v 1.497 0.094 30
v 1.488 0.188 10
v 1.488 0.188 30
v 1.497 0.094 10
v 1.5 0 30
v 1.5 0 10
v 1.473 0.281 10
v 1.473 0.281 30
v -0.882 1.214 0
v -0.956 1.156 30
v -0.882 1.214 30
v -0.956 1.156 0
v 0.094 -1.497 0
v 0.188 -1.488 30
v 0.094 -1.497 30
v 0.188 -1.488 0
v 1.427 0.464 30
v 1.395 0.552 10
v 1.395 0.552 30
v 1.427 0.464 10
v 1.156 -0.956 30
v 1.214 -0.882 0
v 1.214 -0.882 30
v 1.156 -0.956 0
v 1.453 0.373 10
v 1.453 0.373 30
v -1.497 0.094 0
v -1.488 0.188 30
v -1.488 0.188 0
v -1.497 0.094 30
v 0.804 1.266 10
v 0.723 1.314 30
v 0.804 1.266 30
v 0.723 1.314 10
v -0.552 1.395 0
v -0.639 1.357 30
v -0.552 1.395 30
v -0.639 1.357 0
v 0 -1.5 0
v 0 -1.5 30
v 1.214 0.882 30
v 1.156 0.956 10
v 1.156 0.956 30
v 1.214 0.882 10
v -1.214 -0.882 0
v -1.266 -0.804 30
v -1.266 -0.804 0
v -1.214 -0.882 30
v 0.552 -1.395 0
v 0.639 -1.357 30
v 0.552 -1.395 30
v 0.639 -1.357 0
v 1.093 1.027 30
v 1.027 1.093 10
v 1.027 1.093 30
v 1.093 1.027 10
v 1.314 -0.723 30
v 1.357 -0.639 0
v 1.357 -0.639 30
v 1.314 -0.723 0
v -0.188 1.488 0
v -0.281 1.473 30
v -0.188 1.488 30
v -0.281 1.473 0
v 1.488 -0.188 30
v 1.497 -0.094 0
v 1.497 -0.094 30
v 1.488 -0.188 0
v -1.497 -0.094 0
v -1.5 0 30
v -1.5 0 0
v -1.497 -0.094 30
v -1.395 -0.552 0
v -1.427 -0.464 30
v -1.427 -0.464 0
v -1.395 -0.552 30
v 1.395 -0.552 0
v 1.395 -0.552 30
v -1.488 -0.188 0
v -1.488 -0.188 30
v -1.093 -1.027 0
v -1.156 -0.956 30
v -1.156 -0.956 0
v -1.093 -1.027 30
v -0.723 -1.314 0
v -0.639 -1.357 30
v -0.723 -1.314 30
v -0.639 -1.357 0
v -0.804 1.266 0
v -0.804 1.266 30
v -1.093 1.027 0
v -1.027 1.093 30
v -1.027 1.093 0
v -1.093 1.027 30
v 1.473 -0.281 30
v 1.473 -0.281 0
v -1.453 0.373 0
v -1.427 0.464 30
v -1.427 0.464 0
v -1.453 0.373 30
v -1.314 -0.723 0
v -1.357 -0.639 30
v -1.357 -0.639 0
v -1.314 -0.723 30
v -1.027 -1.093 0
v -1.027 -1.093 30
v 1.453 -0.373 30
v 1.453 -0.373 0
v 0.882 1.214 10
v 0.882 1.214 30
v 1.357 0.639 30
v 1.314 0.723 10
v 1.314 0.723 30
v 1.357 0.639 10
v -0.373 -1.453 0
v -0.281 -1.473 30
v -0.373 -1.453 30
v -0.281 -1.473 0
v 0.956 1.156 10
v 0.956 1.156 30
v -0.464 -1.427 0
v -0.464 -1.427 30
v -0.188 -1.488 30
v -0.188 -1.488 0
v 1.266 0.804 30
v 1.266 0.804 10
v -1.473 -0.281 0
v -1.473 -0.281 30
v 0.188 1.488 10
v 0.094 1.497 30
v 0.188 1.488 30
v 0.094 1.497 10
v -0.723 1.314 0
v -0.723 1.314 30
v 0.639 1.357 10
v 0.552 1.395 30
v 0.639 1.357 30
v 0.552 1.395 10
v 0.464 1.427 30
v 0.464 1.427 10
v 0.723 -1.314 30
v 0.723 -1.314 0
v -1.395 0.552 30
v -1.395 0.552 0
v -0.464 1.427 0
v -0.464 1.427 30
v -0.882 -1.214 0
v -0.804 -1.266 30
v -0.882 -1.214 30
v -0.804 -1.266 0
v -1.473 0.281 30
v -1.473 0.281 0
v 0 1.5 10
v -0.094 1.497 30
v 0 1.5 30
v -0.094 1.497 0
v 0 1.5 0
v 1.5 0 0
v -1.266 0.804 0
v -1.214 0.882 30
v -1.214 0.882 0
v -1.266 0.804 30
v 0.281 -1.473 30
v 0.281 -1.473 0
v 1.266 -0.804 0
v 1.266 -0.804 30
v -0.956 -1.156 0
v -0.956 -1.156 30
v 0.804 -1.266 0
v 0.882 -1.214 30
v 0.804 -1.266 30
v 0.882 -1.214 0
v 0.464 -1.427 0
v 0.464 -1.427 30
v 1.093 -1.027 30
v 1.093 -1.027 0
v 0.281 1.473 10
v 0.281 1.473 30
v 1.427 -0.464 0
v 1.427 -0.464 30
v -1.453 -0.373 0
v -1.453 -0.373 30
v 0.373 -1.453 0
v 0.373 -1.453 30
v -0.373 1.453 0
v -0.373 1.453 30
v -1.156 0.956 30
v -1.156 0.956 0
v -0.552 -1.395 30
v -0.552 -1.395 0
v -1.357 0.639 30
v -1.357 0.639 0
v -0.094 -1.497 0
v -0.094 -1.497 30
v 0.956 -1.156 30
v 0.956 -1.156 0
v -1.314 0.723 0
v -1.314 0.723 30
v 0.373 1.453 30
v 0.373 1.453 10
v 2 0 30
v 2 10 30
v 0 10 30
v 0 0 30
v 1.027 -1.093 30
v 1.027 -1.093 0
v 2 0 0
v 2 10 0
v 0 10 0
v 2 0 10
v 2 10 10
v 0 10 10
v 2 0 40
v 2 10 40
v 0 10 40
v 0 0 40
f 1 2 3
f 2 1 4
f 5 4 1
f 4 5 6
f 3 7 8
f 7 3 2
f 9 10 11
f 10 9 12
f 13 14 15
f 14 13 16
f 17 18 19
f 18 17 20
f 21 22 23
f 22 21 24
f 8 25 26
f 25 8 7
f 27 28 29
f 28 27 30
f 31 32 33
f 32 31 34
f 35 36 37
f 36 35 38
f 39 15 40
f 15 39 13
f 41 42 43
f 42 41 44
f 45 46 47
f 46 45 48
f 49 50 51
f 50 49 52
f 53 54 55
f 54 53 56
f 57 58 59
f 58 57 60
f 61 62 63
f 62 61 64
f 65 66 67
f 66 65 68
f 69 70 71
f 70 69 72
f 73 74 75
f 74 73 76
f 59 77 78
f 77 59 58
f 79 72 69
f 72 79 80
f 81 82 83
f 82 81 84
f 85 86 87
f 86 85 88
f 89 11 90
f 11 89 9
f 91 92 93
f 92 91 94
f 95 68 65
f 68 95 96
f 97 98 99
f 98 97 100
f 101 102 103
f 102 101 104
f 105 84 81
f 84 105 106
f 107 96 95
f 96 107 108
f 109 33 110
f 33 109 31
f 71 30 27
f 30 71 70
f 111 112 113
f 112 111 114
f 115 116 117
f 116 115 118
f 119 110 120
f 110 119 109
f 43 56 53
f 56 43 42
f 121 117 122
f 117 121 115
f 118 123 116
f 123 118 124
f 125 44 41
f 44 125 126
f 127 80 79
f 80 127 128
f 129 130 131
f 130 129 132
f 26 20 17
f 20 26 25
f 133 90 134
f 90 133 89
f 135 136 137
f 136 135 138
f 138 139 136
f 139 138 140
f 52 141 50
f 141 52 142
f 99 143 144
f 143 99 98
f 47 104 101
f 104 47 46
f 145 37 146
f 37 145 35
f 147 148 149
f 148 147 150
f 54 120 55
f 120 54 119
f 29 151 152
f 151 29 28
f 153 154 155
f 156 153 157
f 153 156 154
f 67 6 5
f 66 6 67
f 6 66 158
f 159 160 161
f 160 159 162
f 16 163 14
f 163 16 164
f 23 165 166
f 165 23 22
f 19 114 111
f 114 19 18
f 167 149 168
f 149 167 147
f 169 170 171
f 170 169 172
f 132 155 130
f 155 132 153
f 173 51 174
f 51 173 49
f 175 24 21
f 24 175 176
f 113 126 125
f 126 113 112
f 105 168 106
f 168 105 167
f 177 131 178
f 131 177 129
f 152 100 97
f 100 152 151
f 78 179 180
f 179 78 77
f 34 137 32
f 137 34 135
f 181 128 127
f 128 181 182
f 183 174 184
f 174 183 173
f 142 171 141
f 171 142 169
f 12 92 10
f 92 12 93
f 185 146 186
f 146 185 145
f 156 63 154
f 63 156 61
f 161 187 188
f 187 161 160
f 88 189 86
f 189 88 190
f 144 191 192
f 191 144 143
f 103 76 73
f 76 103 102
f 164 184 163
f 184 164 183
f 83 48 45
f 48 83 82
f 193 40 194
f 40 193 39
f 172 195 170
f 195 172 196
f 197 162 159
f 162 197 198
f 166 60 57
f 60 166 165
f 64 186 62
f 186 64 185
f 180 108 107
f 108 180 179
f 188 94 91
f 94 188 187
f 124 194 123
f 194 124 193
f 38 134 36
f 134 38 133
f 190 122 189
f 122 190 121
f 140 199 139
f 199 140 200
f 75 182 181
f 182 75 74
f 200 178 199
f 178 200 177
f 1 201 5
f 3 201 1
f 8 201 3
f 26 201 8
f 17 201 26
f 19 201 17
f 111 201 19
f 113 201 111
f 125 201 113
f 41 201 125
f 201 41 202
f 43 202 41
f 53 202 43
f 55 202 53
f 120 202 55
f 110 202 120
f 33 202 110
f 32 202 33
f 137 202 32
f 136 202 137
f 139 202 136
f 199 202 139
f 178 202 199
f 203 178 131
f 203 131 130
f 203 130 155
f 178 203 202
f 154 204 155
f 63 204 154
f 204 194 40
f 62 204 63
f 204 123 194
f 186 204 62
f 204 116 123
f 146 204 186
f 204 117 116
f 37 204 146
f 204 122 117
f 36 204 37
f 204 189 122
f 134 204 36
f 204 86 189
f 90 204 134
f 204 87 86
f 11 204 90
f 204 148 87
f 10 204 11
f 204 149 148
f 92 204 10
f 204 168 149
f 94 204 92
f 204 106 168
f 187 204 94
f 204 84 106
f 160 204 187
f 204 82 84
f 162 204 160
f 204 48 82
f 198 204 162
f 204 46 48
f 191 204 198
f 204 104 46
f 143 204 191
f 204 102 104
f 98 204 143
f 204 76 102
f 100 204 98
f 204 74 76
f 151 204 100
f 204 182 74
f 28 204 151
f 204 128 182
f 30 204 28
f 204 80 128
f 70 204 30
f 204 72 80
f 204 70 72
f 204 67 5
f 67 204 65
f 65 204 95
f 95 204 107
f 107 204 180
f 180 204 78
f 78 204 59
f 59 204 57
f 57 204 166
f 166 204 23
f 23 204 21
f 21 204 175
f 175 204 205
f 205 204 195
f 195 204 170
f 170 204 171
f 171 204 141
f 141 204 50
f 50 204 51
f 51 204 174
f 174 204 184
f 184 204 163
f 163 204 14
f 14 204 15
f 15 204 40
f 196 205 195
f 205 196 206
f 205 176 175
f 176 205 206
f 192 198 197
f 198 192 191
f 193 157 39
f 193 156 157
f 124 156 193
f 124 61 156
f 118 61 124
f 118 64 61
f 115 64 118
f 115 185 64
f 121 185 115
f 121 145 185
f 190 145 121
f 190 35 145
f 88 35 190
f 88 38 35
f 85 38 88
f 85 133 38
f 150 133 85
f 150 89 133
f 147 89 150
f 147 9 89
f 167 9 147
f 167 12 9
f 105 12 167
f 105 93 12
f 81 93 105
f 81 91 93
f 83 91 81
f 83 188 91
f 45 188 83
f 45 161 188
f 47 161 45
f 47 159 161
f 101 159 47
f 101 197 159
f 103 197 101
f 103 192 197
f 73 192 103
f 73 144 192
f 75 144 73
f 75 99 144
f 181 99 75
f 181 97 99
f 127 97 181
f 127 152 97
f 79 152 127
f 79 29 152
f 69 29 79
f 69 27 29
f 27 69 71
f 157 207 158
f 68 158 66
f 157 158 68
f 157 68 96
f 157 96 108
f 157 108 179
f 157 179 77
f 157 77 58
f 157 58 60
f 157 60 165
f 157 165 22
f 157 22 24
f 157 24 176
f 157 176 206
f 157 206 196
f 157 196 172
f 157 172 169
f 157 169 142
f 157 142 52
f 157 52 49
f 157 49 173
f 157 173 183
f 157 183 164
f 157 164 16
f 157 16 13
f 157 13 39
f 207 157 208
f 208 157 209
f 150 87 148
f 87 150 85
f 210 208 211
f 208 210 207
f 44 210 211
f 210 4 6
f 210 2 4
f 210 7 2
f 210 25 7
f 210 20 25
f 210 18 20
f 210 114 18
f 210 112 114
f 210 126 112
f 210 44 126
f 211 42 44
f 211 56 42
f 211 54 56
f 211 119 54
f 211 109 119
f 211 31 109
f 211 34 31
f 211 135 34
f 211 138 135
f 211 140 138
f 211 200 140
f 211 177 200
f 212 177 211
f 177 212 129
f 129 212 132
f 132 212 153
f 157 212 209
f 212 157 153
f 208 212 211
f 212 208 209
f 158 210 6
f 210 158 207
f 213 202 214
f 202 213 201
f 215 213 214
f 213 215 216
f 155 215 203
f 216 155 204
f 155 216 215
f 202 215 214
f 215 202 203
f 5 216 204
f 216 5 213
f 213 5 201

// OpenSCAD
module key() {
    union() {
        cylinder(d=3 , h= 30, $fn=100);
        translate([0,0,0]) 
            cube([2,10,10]);
         translate([ 0,00,30]) 
            cube([2,10,10]);
   }
}

key(); 
